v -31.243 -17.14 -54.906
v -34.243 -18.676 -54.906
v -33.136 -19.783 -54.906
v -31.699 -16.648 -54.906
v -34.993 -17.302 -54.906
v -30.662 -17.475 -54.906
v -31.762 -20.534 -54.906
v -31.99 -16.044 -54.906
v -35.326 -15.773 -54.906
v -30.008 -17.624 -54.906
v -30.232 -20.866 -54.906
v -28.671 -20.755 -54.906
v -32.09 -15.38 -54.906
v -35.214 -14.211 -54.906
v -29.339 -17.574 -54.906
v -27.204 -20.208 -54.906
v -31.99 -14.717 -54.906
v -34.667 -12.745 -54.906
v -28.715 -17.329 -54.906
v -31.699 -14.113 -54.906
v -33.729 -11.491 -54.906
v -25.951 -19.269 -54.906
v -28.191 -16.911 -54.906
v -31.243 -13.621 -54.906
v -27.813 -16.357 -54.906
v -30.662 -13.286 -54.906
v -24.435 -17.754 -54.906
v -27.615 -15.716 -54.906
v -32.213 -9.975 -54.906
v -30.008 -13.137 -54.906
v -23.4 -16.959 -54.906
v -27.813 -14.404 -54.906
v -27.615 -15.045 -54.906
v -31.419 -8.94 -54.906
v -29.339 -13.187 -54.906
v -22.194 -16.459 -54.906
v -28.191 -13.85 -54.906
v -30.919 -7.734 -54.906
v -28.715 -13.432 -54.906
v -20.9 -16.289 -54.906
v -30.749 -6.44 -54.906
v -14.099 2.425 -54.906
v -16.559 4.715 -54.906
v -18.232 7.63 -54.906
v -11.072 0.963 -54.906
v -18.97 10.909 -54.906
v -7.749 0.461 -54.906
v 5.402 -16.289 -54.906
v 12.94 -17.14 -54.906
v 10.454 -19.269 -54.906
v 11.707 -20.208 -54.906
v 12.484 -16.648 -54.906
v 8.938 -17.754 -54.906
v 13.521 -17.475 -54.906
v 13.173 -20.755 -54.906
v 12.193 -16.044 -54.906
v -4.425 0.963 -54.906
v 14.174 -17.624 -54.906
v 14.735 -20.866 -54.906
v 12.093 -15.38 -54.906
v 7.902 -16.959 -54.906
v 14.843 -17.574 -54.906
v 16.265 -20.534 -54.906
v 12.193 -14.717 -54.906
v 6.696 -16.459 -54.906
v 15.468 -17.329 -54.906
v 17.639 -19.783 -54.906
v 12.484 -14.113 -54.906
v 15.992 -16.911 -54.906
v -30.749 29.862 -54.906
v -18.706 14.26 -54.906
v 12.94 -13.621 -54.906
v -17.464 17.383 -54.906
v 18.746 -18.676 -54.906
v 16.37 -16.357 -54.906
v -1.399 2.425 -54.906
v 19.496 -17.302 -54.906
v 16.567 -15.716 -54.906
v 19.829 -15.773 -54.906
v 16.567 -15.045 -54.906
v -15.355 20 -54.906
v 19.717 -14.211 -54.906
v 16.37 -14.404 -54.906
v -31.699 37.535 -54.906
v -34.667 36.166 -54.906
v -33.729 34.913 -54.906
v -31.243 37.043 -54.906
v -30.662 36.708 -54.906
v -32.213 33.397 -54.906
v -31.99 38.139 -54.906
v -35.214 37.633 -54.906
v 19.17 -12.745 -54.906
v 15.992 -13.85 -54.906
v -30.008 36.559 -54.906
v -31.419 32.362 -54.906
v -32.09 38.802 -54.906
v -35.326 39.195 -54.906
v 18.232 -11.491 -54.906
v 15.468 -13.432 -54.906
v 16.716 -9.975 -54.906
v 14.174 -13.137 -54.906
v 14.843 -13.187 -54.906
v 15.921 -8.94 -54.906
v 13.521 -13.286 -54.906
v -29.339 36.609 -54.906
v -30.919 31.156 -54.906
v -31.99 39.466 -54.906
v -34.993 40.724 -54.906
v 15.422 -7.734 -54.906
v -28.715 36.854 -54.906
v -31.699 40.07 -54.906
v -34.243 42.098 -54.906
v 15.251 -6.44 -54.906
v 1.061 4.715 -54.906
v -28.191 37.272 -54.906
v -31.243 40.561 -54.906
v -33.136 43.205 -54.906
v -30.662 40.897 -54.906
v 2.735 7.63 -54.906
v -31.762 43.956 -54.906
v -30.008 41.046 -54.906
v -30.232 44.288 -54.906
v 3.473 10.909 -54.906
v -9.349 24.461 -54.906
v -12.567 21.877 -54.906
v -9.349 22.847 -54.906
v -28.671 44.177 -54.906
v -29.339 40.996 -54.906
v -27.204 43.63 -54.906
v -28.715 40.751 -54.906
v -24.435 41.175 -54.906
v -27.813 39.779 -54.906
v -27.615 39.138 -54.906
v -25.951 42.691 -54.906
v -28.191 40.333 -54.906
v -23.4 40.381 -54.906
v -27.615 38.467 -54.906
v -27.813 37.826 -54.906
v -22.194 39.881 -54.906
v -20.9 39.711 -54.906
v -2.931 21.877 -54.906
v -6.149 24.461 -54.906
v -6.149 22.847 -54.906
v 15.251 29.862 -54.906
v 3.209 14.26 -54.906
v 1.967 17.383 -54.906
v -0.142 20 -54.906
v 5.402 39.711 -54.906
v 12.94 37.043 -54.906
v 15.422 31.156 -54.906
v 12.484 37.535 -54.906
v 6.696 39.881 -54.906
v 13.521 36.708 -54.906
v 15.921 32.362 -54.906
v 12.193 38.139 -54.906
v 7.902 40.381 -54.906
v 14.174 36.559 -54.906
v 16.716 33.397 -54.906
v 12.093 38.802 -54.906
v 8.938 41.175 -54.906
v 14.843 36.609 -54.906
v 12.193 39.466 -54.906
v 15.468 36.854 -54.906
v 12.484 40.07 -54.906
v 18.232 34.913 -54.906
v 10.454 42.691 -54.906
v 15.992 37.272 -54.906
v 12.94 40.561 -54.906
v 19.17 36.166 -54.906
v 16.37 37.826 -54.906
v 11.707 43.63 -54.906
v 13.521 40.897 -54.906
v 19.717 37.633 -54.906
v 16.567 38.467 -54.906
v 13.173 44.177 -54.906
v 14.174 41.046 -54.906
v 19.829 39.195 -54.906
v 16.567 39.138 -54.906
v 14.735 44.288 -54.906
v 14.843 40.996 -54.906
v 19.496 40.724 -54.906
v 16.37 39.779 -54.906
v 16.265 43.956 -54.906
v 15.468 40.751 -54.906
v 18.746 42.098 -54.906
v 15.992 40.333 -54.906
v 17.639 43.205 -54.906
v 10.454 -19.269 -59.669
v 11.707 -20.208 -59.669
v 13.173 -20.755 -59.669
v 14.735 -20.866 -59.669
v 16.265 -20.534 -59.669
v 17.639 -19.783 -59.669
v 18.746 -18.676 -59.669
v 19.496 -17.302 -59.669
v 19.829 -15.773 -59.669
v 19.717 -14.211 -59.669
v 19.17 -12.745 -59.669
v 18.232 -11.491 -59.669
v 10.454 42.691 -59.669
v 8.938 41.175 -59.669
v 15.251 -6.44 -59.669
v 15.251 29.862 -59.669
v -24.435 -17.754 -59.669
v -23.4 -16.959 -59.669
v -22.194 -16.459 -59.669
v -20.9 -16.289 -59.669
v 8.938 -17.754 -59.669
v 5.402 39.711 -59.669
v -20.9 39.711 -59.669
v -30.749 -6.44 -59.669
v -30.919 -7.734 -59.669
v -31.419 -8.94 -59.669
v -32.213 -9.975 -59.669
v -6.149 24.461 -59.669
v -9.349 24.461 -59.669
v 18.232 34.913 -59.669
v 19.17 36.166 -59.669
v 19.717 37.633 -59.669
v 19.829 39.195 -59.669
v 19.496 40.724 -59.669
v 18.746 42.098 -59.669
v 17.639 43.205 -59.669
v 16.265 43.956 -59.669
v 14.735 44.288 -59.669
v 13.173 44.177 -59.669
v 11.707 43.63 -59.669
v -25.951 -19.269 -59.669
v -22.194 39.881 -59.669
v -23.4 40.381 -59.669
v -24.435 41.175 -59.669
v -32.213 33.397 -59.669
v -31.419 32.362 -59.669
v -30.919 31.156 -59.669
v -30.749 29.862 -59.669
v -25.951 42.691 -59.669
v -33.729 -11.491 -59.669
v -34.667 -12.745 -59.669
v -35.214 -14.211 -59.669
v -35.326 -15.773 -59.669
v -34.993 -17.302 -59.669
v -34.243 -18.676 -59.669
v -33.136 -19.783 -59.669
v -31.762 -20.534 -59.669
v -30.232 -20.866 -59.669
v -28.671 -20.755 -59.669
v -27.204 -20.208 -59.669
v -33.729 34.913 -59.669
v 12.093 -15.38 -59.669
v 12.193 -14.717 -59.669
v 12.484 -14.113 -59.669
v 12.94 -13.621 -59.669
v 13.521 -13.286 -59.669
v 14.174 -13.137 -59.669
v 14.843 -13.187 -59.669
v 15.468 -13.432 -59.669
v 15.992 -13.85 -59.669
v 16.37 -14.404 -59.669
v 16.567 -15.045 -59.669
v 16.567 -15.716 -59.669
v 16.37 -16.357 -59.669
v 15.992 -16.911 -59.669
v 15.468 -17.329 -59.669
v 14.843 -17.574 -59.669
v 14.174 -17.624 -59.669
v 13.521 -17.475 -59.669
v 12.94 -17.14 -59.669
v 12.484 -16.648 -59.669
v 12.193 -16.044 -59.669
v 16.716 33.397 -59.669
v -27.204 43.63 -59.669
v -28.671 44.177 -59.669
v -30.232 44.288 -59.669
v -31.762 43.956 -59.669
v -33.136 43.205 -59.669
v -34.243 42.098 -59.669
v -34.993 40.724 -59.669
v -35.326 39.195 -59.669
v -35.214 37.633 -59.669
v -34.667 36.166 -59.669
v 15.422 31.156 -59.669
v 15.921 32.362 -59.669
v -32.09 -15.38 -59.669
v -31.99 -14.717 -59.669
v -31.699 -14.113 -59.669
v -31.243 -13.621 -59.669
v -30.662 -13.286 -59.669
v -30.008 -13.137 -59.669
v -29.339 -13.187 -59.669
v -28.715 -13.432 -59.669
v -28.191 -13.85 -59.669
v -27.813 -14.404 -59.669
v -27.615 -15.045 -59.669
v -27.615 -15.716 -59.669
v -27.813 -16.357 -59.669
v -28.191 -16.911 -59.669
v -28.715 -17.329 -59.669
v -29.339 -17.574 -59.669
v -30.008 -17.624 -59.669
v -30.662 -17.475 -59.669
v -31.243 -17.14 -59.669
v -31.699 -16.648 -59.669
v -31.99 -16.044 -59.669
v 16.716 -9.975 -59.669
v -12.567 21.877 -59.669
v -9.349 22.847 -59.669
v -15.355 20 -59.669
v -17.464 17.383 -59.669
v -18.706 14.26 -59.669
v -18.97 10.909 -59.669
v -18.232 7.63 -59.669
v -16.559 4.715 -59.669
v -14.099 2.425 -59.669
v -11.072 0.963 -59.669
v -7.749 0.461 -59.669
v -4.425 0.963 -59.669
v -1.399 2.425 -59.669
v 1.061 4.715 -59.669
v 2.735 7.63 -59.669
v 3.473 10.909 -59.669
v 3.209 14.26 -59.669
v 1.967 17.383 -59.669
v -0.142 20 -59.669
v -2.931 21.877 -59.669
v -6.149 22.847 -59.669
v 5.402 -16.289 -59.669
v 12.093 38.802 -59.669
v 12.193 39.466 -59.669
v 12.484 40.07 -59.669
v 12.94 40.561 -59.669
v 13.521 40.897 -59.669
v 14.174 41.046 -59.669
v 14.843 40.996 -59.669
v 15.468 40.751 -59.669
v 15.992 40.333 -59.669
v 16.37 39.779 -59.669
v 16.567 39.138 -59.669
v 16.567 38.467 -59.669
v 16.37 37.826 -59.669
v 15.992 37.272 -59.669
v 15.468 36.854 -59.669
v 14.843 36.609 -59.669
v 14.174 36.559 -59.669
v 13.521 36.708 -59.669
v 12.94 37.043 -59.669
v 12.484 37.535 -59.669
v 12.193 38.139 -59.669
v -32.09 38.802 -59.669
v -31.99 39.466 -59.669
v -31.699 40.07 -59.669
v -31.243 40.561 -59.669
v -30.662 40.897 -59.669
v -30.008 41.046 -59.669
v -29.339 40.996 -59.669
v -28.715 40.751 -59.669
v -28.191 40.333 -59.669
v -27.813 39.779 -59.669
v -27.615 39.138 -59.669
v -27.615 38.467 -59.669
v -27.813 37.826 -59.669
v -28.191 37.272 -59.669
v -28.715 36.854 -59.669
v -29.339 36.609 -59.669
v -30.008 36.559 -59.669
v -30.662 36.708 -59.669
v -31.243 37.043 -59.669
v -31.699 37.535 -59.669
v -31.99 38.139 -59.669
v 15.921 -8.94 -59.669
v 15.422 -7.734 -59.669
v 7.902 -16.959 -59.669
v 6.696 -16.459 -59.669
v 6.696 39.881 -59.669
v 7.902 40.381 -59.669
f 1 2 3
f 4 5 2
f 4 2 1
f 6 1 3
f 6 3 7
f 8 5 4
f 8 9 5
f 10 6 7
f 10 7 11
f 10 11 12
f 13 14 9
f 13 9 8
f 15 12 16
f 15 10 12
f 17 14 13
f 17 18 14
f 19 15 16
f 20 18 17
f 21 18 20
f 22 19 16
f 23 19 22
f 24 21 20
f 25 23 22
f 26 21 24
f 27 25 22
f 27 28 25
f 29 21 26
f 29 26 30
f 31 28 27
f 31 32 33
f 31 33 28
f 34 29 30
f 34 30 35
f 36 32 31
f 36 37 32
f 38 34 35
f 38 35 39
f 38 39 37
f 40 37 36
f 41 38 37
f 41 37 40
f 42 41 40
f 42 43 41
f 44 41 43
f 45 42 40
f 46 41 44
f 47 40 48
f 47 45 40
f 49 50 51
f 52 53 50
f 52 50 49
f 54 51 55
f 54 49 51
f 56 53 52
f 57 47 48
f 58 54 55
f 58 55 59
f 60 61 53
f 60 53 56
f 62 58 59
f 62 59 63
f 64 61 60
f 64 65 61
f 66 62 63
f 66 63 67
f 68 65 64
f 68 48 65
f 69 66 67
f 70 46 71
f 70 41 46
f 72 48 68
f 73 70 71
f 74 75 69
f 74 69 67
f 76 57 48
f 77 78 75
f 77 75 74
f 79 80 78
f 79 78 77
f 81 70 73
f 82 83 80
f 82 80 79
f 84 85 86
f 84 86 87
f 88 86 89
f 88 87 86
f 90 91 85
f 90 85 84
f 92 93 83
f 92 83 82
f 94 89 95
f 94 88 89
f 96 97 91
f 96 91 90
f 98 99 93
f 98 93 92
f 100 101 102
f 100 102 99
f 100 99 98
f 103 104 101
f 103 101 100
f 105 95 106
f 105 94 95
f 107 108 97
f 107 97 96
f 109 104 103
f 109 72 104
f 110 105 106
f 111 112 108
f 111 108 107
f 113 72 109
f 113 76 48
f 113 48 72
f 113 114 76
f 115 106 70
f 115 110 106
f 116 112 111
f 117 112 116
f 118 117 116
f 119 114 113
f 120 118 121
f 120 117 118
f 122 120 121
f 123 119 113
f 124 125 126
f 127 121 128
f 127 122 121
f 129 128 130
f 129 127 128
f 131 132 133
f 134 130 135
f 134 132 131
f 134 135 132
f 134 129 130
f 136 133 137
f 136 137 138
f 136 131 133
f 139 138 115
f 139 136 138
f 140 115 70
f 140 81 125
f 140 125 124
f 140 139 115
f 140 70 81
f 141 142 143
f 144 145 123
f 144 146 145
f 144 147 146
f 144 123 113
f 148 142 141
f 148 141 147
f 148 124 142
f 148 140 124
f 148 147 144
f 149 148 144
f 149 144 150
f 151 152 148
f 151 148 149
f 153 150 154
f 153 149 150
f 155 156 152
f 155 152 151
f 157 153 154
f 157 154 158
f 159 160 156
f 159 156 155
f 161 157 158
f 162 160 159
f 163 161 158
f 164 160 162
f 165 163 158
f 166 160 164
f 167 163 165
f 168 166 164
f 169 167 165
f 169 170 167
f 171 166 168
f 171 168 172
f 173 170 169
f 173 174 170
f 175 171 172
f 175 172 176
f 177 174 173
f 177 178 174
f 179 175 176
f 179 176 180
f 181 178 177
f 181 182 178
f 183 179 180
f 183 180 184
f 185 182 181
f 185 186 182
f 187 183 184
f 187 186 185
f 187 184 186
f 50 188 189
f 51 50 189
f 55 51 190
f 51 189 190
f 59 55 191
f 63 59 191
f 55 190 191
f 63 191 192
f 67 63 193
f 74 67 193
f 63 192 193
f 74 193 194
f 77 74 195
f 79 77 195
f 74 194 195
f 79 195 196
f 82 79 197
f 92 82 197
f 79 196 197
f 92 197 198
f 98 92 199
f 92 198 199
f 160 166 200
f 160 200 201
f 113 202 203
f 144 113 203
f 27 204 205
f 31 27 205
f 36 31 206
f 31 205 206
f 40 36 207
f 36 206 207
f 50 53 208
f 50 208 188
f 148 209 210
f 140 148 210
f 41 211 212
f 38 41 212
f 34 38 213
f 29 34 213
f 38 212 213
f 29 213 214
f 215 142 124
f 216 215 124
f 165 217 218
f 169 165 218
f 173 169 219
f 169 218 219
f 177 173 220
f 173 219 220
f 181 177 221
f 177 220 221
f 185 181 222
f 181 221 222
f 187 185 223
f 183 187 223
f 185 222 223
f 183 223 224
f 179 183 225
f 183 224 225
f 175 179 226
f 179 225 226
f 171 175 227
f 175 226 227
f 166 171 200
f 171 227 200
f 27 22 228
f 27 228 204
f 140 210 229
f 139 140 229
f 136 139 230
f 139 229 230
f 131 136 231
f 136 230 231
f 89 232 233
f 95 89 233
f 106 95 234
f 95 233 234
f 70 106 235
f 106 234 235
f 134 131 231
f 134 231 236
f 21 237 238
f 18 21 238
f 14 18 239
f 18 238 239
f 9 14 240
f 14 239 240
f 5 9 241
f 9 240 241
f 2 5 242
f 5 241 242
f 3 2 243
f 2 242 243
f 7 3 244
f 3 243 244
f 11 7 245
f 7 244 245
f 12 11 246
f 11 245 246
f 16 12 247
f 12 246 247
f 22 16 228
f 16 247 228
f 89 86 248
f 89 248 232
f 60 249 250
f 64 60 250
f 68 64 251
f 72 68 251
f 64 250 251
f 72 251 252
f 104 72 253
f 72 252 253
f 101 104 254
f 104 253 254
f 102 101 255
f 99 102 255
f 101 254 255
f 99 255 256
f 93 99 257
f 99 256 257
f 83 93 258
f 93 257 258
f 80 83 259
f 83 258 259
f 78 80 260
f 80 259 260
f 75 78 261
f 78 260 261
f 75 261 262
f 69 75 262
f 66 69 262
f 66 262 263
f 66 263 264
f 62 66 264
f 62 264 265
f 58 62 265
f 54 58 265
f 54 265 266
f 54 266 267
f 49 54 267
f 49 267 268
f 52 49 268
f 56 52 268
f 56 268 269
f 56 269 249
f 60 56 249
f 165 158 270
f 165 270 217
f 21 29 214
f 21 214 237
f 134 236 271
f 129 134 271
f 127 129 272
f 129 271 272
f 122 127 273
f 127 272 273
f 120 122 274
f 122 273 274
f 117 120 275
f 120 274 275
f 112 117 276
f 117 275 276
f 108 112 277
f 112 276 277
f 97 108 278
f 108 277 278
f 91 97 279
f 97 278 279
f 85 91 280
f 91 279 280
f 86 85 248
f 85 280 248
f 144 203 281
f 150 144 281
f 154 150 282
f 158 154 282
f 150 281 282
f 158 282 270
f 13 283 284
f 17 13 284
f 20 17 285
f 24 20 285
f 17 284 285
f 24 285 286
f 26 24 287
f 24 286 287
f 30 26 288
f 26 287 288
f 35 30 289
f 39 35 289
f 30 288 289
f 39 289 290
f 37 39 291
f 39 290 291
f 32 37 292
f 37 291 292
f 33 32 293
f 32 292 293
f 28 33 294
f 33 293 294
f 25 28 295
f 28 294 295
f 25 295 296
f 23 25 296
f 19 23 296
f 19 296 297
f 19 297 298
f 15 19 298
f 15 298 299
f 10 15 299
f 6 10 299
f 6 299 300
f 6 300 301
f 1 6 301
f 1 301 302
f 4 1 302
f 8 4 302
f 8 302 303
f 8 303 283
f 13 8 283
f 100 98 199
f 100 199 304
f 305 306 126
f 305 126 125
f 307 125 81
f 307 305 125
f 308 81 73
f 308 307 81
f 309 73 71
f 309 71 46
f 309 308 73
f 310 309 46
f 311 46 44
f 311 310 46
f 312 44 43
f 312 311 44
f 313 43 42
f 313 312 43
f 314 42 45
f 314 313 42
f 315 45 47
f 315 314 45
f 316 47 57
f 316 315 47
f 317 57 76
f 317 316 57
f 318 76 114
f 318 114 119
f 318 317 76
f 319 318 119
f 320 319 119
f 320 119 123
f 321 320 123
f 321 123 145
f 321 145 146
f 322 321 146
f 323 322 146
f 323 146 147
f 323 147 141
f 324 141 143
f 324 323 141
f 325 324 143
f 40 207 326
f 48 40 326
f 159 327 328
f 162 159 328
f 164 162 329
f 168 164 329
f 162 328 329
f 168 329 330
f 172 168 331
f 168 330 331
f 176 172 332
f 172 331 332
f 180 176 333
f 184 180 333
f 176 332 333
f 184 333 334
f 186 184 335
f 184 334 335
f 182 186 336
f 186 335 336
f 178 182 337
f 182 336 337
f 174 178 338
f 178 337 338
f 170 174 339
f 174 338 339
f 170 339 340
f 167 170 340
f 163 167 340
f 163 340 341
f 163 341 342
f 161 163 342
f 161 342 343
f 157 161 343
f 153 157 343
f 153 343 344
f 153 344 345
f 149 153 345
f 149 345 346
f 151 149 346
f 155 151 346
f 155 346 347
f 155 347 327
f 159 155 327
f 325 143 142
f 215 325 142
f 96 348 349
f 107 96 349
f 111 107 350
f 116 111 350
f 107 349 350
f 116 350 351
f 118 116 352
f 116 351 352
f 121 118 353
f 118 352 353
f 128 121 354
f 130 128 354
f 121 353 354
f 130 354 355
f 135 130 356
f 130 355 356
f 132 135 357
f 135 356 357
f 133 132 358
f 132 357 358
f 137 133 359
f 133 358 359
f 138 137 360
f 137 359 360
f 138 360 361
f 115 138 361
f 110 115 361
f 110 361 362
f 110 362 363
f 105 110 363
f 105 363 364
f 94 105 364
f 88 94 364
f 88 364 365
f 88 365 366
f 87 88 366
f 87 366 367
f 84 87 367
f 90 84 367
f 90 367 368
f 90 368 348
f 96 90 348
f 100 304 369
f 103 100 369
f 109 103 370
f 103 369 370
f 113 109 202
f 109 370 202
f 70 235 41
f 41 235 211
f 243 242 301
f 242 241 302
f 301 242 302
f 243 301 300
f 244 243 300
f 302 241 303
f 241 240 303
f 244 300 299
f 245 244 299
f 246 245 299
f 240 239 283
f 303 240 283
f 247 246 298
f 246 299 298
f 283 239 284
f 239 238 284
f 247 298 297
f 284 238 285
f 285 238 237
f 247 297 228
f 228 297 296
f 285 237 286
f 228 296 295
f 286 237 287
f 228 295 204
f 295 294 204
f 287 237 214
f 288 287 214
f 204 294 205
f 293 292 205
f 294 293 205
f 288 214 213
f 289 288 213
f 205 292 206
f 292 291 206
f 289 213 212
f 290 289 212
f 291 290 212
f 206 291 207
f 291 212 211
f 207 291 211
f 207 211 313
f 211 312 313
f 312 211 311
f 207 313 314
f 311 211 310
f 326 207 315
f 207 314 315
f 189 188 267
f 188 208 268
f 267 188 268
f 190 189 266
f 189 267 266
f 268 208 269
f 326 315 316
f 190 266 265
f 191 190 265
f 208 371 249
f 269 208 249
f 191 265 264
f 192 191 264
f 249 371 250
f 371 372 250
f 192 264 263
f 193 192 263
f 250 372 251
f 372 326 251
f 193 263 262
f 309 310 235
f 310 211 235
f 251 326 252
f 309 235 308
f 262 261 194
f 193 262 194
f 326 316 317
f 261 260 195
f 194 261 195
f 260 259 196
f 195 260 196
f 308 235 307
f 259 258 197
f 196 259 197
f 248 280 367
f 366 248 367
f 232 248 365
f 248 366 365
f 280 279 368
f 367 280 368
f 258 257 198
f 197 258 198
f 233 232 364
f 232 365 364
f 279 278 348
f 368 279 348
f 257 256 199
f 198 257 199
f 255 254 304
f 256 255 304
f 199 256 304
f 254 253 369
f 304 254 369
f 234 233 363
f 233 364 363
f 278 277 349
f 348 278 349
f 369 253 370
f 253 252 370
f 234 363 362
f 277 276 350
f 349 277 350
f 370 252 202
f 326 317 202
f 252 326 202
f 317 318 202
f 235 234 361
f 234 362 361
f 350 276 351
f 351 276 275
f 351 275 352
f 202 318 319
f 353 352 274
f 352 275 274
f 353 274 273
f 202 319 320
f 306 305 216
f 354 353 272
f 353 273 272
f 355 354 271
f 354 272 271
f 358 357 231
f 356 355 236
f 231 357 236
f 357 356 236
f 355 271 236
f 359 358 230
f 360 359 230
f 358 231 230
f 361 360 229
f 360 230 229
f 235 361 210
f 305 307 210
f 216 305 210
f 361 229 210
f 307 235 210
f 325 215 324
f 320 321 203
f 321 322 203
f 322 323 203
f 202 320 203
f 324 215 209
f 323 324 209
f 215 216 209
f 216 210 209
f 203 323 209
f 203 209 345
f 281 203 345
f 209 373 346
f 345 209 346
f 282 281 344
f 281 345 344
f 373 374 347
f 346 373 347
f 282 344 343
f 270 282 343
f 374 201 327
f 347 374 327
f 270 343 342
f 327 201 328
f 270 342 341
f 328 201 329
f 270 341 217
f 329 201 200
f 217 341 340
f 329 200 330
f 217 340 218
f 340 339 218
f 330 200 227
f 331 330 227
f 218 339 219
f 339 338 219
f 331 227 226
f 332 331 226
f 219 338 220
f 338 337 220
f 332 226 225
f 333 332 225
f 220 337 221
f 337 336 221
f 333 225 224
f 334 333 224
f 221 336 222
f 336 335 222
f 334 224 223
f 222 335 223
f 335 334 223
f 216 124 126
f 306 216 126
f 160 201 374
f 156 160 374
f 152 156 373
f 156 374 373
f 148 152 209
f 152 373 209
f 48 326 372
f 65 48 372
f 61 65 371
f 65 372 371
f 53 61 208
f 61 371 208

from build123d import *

# Parameters (mm, degrees)
BOSS_EXTRUDE1_DEPTH  = 4.7625
M4_CLEARANCE_HOLE2_D = 4.5


with BuildPart() as part:
    # Sketch4 → Boss-Extrude1 (new body)
    with BuildSketch(Plane.XY.offset(-59.668926648)):
        with BuildLine():
            Line((5.401994847, 39.710959692), (-20.899520343, 39.710959692))
            ThreePointArc((-20.899520343, 39.710959692), (-22.812937505, 40.091562029), (-24.435054249, 41.175425786))
            Line((-24.435054249, 41.175425786), (-25.951045701, 42.691417238))
            ThreePointArc((-25.951045701, 42.691417238), (-33.729220295, 42.691417238), (-33.729220295, 34.913242645))
            Line((-33.729220295, 34.913242645), (-32.213228842, 33.397251193))
            ThreePointArc((-32.213228842, 33.397251193), (-31.129365086, 31.775134449), (-30.748762748, 29.861717287))
            Line((-30.748762748, 29.861717287), (-30.748762748, -6.439797903))
            ThreePointArc((-30.748762748, -6.439797903), (-31.129365086, -8.353215065), (-32.213228842, -9.975331809))
            Line((-32.213228842, -9.975331809), (-33.729220295, -11.491323262))
            ThreePointArc((-33.729220295, -11.491323262), (-33.729220295, -19.269497855), (-25.951045701, -19.269497855))
            Line((-25.951045701, -19.269497855), (-24.435054249, -17.753506402))
            ThreePointArc((-24.435054249, -17.753506402), (-22.812937505, -16.669642646), (-20.899520343, -16.289040308))
            Line((-20.899520343, -16.289040308), (5.401994847, -16.289040308))
            ThreePointArc((5.401994847, -16.289040308), (7.315412009, -16.669642646), (8.937528753, -17.753506402))
            Line((8.937528753, -17.753506402), (10.453520205, -19.269497855))
            ThreePointArc((10.453520205, -19.269497855), (18.231694798, -19.269497855), (18.231694798, -11.491323262))
            Line((18.231694798, -11.491323262), (16.715703346, -9.975331809))
            ThreePointArc((16.715703346, -9.975331809), (15.631839589, -8.353215065), (15.251237252, -6.439797903))
            Line((15.251237252, -6.439797903), (15.251237252, 29.861717287))
            ThreePointArc((15.251237252, 29.861717287), (15.631839589, 31.775134449), (16.715703346, 33.397251193))
            Line((16.715703346, 33.397251193), (18.231694798, 34.913242645))
            ThreePointArc((18.231694798, 34.913242645), (18.231694798, 42.691417238), (10.453520205, 42.691417238))
            Line((10.453520205, 42.691417238), (8.937528753, 41.175425786))
            ThreePointArc((8.937528753, 41.175425786), (7.315412009, 40.091562029), (5.401994847, 39.710959692))
        make_face()
        with BuildLine():
            Line((-6.148762748, 22.84660067), (-6.148762748, 24.460959692))
            Line((-6.148762748, 24.460959692), (-9.348762748, 24.460959692))
            Line((-9.348762748, 24.460959692), (-9.348762748, 22.84660067))
            ThreePointArc((-9.348762748, 22.84660067), (-7.748762748, 0.460959692), (-6.148762748, 22.84660067))
        make_face(mode=Mode.SUBTRACT)
    extrude(amount=BOSS_EXTRUDE1_DEPTH)

    # M4 Clearance Hole2 (through all)
    with Locations(Plane.XY.offset(-54.906426648)):
        with Locations((-29.840132998, 38.802329941), (14.342607502, 38.802329941), (14.342607502, -15.380410558), (-29.840132998, -15.380410558)):
            Hole(M4_CLEARANCE_HOLE2_D / 2)


solid = part.part
